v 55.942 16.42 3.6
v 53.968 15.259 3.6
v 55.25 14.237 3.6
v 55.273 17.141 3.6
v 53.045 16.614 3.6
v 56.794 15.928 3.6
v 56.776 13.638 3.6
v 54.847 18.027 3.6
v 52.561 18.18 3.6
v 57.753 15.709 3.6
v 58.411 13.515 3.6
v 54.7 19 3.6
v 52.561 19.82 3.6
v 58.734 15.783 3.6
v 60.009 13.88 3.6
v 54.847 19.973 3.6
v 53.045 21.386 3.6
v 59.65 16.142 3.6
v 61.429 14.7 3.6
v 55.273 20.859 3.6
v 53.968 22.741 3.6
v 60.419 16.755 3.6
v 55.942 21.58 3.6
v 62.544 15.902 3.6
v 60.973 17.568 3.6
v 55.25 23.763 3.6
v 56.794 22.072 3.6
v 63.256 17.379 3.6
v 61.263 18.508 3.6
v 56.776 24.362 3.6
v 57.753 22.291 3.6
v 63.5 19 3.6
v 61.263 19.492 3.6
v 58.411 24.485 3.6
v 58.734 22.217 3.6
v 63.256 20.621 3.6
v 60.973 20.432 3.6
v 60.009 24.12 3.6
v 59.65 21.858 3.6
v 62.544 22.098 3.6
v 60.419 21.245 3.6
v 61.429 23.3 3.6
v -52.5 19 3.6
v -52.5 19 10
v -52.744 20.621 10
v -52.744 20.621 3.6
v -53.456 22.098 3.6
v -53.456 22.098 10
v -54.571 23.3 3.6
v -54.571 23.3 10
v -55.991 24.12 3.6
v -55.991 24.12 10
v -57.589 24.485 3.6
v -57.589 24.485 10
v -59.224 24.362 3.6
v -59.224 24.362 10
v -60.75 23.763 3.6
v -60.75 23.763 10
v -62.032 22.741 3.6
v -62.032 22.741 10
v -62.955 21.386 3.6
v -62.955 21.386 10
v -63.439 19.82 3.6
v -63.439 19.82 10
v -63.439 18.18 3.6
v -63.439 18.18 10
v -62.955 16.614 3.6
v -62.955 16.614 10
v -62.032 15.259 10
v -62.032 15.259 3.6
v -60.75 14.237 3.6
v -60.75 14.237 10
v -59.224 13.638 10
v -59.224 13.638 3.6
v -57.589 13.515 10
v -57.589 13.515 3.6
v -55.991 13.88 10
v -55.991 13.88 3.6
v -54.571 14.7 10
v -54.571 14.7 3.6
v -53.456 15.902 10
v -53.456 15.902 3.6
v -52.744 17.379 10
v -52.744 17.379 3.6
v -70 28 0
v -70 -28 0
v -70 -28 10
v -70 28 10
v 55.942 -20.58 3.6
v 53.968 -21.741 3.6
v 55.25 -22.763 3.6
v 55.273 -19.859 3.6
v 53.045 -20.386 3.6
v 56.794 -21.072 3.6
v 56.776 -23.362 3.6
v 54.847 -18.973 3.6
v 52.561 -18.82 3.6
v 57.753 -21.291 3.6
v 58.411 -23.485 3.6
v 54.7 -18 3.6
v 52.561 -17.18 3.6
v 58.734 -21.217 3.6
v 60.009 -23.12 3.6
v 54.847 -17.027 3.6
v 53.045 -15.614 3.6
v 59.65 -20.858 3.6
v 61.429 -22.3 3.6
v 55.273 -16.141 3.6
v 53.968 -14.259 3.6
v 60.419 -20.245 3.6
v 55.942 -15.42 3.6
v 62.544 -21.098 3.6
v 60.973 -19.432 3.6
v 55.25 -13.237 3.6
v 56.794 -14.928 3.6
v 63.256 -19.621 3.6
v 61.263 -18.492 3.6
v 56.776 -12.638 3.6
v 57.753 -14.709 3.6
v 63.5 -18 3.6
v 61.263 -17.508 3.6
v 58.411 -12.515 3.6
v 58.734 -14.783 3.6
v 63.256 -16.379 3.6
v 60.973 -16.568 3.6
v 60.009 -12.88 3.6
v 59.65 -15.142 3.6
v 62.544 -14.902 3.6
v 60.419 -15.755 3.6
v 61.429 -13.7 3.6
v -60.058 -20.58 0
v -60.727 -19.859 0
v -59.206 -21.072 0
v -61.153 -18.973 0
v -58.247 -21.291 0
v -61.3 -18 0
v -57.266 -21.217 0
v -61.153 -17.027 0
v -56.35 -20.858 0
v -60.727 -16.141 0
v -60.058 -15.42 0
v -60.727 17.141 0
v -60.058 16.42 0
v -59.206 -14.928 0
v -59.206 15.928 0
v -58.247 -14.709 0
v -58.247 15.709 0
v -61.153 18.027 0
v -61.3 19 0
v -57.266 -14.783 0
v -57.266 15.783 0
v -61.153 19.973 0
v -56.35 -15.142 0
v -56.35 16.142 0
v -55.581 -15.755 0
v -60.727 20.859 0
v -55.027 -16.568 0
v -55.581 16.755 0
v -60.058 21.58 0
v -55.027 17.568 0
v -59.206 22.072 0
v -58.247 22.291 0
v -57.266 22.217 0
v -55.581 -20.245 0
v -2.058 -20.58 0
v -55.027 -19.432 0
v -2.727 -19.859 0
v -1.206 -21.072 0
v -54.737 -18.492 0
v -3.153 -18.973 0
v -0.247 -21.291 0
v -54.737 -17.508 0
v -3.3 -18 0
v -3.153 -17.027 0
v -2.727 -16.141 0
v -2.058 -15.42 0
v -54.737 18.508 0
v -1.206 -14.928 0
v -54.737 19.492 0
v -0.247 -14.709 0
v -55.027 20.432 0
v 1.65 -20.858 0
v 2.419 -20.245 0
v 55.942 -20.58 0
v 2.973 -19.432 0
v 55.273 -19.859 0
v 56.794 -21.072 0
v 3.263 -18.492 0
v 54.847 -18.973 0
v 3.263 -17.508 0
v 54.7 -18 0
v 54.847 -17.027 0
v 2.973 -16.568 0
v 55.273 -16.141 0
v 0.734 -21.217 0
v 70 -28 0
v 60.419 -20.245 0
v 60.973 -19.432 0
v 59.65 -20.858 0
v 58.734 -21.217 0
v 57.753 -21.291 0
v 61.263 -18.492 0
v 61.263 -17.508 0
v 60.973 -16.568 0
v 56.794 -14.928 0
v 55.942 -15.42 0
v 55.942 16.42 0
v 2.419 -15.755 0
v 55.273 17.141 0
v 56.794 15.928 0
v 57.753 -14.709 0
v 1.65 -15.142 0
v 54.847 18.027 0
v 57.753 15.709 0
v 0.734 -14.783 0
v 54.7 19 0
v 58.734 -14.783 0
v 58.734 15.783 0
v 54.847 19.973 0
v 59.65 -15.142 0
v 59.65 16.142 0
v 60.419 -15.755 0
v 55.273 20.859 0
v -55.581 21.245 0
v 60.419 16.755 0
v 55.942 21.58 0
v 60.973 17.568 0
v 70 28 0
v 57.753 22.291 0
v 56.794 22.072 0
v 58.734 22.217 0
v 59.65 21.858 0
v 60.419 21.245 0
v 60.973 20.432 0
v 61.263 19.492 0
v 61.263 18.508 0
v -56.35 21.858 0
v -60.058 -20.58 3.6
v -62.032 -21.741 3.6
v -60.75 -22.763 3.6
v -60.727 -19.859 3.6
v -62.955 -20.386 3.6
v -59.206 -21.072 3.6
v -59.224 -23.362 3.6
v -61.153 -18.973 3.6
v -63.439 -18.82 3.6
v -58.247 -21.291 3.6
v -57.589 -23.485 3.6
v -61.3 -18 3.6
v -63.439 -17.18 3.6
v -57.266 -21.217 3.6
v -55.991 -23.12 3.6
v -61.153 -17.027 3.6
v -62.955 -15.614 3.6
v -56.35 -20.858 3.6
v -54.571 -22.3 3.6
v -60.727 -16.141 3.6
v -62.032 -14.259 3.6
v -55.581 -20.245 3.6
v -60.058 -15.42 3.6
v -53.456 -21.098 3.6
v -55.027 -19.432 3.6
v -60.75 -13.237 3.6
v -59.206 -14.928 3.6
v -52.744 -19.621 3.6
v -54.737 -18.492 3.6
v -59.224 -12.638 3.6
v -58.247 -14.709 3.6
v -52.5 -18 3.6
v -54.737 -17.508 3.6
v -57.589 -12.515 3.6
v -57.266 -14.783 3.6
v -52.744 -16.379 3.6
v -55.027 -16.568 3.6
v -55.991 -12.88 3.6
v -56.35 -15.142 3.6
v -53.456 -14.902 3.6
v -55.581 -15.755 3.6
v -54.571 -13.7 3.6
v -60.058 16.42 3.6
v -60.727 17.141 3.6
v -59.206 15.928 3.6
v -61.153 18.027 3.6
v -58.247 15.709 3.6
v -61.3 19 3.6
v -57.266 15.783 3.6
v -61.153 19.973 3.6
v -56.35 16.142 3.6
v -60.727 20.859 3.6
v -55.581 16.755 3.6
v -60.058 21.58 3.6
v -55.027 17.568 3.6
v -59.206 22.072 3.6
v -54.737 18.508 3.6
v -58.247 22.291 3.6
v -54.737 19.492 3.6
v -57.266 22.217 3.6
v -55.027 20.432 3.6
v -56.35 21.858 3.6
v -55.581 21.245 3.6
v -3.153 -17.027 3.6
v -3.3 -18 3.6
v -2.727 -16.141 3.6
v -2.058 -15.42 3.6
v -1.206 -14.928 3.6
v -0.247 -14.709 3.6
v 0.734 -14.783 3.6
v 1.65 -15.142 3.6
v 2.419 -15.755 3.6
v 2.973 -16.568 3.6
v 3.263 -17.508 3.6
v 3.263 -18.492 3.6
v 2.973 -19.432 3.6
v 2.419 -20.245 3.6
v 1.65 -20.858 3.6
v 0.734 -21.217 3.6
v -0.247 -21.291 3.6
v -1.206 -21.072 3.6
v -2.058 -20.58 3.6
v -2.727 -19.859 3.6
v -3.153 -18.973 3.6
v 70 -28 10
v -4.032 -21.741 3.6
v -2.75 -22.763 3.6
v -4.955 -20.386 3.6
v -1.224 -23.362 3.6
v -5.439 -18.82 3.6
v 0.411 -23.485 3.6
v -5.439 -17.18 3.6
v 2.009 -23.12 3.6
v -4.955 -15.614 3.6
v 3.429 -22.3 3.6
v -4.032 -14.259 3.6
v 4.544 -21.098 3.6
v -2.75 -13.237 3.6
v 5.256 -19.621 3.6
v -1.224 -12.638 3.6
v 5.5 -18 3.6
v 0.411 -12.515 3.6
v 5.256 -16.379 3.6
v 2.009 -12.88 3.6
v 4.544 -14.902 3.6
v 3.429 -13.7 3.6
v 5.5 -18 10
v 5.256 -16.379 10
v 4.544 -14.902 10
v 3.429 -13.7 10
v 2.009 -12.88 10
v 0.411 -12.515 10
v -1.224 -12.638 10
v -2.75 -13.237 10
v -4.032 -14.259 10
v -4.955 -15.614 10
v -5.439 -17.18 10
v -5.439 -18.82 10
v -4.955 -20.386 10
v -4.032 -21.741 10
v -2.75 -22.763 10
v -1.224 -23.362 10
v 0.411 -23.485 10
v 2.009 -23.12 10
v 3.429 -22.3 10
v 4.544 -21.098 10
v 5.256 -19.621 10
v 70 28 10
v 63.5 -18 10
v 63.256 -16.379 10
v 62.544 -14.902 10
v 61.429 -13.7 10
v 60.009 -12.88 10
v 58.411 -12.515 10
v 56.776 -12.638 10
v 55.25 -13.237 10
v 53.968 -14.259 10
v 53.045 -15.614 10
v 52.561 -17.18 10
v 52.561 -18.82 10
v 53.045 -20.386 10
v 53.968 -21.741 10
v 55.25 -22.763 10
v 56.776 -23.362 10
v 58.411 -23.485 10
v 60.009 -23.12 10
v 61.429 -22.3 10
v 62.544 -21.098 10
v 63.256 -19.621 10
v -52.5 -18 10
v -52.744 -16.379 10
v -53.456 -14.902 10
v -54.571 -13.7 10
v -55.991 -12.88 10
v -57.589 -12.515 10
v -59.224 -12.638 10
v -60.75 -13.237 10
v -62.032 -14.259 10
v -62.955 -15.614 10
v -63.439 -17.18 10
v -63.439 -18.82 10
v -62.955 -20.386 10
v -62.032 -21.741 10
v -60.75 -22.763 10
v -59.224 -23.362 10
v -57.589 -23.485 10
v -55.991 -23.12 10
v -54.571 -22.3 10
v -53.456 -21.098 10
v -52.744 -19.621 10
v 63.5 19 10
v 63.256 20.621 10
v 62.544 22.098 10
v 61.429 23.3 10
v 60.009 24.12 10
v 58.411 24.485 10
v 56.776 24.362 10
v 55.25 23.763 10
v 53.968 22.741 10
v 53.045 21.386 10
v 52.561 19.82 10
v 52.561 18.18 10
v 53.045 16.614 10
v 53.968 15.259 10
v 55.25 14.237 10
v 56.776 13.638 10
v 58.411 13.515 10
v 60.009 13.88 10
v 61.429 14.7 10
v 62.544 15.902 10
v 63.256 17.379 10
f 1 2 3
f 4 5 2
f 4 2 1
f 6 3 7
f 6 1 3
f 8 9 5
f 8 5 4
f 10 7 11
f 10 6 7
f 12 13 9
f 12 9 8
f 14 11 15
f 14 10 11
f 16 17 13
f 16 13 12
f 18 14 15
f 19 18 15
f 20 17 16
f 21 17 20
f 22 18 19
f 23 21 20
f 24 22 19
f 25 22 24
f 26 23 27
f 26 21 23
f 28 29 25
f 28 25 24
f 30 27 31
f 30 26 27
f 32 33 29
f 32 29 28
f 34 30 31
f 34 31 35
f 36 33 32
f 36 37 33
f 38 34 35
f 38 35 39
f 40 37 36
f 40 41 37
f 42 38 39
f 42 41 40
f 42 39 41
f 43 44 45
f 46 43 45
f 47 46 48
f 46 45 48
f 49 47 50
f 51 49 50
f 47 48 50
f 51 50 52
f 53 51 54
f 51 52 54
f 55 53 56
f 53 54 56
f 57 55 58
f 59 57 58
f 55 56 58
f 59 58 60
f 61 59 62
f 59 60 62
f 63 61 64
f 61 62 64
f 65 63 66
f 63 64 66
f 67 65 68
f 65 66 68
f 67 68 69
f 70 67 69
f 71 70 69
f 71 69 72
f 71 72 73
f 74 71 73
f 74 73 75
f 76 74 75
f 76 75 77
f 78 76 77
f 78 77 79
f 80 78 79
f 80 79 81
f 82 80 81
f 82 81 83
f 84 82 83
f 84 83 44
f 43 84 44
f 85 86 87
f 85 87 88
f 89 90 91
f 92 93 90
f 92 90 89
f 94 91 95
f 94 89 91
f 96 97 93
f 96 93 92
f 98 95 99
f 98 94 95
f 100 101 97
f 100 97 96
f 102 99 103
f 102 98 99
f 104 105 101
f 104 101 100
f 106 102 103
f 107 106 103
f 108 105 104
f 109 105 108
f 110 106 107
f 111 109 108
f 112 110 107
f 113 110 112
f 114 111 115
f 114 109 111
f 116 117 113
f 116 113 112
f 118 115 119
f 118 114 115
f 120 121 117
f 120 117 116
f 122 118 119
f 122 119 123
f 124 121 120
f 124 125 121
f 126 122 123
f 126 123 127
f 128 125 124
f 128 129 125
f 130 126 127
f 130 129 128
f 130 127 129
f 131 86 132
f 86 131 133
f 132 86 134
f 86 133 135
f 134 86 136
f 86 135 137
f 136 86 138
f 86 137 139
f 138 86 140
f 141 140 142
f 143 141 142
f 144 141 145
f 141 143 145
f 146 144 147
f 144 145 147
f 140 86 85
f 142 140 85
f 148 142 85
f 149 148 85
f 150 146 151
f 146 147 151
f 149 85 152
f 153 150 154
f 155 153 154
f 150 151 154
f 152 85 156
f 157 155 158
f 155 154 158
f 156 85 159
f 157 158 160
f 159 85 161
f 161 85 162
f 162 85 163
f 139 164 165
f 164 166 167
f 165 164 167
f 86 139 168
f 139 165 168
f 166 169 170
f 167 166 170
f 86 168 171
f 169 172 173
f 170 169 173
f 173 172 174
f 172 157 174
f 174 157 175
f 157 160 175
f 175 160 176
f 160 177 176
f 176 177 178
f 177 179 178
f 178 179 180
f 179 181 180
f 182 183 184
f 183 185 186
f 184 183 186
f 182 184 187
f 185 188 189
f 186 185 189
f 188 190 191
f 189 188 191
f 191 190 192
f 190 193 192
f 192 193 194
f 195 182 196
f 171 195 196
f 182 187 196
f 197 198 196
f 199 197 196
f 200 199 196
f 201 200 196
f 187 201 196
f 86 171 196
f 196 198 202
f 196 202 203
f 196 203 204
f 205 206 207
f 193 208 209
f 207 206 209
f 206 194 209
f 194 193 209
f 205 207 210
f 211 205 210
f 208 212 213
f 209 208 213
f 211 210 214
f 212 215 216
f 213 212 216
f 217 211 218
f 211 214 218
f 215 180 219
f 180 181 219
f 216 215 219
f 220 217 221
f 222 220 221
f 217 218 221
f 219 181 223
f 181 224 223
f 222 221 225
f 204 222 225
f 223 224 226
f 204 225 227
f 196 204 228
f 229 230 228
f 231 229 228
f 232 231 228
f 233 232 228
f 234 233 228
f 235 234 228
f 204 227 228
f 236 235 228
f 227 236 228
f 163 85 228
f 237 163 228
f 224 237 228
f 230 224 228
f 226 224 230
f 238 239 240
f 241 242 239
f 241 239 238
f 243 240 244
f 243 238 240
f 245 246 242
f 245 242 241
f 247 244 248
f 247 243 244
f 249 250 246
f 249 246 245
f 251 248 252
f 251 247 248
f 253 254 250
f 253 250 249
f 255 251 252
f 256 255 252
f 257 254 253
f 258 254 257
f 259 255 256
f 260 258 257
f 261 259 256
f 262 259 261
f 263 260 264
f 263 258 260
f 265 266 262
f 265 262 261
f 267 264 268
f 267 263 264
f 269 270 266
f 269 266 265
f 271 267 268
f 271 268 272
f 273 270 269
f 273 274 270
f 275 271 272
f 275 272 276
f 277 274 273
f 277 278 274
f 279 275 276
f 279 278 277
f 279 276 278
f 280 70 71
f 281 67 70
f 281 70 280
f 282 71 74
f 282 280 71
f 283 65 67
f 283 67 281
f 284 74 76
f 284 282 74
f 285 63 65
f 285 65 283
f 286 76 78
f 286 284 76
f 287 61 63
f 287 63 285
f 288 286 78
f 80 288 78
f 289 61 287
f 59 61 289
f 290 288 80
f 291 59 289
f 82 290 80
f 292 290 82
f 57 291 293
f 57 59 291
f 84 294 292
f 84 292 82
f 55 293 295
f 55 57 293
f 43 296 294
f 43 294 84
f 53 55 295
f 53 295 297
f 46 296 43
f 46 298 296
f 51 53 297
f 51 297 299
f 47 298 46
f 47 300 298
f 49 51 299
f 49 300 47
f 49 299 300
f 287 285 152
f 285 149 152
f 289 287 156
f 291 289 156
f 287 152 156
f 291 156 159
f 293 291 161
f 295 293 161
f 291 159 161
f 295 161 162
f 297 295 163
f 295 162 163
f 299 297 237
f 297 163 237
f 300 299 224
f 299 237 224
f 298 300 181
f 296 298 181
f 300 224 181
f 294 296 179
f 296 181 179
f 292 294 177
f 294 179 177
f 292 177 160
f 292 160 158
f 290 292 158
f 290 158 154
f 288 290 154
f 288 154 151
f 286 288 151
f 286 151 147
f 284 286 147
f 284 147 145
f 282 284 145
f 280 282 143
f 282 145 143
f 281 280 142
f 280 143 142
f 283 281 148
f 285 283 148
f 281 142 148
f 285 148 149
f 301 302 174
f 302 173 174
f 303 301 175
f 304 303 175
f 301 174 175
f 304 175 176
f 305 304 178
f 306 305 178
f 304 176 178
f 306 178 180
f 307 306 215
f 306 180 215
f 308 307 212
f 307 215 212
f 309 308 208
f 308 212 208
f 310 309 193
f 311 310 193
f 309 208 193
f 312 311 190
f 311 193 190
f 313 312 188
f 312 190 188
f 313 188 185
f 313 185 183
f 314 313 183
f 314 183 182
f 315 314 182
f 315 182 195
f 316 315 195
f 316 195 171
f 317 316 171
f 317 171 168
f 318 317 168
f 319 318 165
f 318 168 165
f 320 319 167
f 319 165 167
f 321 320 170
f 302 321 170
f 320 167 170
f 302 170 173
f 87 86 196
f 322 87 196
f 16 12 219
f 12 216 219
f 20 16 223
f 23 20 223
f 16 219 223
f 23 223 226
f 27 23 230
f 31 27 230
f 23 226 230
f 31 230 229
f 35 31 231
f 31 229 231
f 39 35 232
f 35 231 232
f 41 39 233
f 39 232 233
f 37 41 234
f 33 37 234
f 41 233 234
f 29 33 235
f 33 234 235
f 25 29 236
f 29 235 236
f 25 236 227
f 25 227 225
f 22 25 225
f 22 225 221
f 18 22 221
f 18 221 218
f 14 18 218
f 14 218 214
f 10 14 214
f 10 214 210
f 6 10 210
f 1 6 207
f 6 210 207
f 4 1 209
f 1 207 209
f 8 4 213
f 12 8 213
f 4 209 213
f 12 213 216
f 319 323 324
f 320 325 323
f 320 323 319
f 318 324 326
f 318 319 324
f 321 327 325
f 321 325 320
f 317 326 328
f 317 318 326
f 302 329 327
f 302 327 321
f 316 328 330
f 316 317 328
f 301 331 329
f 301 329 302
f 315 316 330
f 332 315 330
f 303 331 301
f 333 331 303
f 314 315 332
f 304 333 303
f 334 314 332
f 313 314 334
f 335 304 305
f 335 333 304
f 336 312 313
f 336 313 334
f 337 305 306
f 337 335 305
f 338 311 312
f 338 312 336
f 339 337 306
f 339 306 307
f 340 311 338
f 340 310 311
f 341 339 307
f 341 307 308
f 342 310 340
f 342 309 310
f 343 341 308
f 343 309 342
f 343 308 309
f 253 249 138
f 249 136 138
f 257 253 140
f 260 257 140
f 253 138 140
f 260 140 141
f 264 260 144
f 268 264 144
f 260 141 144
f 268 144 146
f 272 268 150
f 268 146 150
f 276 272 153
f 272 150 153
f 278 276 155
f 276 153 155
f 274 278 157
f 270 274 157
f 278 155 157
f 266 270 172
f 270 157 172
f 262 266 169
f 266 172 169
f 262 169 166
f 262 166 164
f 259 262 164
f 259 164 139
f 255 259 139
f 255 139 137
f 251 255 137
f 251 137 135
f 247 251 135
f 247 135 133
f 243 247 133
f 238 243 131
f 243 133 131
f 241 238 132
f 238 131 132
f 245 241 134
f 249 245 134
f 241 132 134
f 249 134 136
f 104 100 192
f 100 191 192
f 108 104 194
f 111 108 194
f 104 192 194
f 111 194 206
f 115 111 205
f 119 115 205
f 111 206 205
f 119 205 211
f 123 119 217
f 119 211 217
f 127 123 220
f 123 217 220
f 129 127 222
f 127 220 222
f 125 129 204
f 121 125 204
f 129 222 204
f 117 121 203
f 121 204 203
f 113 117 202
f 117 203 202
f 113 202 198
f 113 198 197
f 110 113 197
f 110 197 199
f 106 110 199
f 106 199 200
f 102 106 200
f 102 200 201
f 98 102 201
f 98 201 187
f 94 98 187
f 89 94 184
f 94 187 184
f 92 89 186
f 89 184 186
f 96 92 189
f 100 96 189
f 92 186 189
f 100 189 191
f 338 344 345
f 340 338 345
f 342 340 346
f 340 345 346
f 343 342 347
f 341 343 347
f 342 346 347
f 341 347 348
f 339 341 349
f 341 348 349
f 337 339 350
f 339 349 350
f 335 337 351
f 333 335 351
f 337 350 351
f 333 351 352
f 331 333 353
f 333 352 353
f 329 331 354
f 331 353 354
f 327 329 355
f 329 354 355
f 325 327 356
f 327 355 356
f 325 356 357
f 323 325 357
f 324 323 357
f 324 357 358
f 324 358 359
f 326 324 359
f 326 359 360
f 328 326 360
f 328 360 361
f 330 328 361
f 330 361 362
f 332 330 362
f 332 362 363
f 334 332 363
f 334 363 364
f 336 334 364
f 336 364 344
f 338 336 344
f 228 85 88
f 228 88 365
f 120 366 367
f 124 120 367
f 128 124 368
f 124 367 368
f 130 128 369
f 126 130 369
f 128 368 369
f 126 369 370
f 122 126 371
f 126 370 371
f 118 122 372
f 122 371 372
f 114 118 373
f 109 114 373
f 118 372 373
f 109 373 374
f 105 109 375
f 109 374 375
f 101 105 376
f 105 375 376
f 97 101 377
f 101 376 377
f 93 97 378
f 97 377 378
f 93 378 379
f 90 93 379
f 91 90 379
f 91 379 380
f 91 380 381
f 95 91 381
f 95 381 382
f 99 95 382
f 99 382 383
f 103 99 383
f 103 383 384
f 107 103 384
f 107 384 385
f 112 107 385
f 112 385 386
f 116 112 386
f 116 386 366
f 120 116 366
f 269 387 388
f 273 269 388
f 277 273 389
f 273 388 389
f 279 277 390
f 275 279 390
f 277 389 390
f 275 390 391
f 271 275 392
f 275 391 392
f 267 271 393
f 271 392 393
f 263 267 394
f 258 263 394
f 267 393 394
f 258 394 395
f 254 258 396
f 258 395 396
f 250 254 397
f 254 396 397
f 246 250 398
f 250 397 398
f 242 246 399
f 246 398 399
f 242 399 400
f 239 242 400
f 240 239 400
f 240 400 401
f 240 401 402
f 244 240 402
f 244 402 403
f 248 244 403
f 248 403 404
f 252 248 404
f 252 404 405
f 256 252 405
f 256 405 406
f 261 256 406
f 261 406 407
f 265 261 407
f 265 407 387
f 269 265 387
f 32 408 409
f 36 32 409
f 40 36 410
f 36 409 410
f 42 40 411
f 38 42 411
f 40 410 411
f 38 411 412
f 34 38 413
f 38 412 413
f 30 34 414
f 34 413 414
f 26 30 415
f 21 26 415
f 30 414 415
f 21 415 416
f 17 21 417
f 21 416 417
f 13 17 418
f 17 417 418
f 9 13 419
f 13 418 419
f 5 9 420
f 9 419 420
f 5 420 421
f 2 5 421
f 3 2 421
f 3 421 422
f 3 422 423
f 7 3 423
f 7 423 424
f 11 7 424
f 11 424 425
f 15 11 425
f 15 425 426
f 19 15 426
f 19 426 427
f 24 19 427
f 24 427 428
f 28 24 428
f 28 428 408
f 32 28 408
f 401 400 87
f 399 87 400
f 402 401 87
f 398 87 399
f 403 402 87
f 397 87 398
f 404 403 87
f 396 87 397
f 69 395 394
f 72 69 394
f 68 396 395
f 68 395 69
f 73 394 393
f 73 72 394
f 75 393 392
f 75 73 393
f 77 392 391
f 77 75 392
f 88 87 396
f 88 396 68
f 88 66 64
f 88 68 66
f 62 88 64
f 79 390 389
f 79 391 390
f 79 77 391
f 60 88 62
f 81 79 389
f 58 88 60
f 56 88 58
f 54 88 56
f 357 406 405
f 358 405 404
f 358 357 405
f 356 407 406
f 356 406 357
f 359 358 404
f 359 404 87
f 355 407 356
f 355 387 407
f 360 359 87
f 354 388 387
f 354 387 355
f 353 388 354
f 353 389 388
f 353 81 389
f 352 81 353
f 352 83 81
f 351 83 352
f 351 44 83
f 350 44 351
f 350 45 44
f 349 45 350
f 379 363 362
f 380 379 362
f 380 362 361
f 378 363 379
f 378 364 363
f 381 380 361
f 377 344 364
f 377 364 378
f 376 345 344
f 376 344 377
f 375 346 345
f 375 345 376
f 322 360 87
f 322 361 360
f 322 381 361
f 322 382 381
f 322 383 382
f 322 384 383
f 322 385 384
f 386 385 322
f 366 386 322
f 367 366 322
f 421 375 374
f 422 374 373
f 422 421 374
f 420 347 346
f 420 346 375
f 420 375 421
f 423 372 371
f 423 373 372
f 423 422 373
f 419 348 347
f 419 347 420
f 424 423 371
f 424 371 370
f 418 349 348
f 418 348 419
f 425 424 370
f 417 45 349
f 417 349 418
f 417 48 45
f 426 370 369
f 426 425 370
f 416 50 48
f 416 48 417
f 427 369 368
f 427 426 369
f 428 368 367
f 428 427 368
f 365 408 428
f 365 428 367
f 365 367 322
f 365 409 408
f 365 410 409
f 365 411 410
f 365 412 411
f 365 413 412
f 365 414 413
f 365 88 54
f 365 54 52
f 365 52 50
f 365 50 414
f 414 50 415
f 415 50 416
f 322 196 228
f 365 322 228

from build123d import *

# Parameters (mm, degrees)
SKETCH1_W                                           = 140
SKETCH1_H                                           = 56
EXTRUDE1_DEPTH                                      = 10
CBORE_FOR_M6_HEX_SOCKET_HEAD_CAP_SCREW1_D           = 6.6
CBORE_FOR_M6_HEX_SOCKET_HEAD_CAP_SCREW1_CBORE_D     = 11
CBORE_FOR_M6_HEX_SOCKET_HEAD_CAP_SCREW1_CBORE_DEPTH = 6.4


with BuildPart() as part:
    # Sketch1 → Extrude1 (new body)
    with BuildSketch(Plane.XY):
        Rectangle(SKETCH1_W, SKETCH1_H)
    extrude(amount=EXTRUDE1_DEPTH)

    # CBORE for M6 Hex Socket Head Cap Screw1 (through all)
    with Locations(Plane.XY.offset(10)):
        with Locations((58, -18), (58, 19), (0, -18), (-58, -18), (-58, 19)):
            CounterBoreHole(CBORE_FOR_M6_HEX_SOCKET_HEAD_CAP_SCREW1_D / 2, CBORE_FOR_M6_HEX_SOCKET_HEAD_CAP_SCREW1_CBORE_D / 2, CBORE_FOR_M6_HEX_SOCKET_HEAD_CAP_SCREW1_CBORE_DEPTH)


solid = part.part
